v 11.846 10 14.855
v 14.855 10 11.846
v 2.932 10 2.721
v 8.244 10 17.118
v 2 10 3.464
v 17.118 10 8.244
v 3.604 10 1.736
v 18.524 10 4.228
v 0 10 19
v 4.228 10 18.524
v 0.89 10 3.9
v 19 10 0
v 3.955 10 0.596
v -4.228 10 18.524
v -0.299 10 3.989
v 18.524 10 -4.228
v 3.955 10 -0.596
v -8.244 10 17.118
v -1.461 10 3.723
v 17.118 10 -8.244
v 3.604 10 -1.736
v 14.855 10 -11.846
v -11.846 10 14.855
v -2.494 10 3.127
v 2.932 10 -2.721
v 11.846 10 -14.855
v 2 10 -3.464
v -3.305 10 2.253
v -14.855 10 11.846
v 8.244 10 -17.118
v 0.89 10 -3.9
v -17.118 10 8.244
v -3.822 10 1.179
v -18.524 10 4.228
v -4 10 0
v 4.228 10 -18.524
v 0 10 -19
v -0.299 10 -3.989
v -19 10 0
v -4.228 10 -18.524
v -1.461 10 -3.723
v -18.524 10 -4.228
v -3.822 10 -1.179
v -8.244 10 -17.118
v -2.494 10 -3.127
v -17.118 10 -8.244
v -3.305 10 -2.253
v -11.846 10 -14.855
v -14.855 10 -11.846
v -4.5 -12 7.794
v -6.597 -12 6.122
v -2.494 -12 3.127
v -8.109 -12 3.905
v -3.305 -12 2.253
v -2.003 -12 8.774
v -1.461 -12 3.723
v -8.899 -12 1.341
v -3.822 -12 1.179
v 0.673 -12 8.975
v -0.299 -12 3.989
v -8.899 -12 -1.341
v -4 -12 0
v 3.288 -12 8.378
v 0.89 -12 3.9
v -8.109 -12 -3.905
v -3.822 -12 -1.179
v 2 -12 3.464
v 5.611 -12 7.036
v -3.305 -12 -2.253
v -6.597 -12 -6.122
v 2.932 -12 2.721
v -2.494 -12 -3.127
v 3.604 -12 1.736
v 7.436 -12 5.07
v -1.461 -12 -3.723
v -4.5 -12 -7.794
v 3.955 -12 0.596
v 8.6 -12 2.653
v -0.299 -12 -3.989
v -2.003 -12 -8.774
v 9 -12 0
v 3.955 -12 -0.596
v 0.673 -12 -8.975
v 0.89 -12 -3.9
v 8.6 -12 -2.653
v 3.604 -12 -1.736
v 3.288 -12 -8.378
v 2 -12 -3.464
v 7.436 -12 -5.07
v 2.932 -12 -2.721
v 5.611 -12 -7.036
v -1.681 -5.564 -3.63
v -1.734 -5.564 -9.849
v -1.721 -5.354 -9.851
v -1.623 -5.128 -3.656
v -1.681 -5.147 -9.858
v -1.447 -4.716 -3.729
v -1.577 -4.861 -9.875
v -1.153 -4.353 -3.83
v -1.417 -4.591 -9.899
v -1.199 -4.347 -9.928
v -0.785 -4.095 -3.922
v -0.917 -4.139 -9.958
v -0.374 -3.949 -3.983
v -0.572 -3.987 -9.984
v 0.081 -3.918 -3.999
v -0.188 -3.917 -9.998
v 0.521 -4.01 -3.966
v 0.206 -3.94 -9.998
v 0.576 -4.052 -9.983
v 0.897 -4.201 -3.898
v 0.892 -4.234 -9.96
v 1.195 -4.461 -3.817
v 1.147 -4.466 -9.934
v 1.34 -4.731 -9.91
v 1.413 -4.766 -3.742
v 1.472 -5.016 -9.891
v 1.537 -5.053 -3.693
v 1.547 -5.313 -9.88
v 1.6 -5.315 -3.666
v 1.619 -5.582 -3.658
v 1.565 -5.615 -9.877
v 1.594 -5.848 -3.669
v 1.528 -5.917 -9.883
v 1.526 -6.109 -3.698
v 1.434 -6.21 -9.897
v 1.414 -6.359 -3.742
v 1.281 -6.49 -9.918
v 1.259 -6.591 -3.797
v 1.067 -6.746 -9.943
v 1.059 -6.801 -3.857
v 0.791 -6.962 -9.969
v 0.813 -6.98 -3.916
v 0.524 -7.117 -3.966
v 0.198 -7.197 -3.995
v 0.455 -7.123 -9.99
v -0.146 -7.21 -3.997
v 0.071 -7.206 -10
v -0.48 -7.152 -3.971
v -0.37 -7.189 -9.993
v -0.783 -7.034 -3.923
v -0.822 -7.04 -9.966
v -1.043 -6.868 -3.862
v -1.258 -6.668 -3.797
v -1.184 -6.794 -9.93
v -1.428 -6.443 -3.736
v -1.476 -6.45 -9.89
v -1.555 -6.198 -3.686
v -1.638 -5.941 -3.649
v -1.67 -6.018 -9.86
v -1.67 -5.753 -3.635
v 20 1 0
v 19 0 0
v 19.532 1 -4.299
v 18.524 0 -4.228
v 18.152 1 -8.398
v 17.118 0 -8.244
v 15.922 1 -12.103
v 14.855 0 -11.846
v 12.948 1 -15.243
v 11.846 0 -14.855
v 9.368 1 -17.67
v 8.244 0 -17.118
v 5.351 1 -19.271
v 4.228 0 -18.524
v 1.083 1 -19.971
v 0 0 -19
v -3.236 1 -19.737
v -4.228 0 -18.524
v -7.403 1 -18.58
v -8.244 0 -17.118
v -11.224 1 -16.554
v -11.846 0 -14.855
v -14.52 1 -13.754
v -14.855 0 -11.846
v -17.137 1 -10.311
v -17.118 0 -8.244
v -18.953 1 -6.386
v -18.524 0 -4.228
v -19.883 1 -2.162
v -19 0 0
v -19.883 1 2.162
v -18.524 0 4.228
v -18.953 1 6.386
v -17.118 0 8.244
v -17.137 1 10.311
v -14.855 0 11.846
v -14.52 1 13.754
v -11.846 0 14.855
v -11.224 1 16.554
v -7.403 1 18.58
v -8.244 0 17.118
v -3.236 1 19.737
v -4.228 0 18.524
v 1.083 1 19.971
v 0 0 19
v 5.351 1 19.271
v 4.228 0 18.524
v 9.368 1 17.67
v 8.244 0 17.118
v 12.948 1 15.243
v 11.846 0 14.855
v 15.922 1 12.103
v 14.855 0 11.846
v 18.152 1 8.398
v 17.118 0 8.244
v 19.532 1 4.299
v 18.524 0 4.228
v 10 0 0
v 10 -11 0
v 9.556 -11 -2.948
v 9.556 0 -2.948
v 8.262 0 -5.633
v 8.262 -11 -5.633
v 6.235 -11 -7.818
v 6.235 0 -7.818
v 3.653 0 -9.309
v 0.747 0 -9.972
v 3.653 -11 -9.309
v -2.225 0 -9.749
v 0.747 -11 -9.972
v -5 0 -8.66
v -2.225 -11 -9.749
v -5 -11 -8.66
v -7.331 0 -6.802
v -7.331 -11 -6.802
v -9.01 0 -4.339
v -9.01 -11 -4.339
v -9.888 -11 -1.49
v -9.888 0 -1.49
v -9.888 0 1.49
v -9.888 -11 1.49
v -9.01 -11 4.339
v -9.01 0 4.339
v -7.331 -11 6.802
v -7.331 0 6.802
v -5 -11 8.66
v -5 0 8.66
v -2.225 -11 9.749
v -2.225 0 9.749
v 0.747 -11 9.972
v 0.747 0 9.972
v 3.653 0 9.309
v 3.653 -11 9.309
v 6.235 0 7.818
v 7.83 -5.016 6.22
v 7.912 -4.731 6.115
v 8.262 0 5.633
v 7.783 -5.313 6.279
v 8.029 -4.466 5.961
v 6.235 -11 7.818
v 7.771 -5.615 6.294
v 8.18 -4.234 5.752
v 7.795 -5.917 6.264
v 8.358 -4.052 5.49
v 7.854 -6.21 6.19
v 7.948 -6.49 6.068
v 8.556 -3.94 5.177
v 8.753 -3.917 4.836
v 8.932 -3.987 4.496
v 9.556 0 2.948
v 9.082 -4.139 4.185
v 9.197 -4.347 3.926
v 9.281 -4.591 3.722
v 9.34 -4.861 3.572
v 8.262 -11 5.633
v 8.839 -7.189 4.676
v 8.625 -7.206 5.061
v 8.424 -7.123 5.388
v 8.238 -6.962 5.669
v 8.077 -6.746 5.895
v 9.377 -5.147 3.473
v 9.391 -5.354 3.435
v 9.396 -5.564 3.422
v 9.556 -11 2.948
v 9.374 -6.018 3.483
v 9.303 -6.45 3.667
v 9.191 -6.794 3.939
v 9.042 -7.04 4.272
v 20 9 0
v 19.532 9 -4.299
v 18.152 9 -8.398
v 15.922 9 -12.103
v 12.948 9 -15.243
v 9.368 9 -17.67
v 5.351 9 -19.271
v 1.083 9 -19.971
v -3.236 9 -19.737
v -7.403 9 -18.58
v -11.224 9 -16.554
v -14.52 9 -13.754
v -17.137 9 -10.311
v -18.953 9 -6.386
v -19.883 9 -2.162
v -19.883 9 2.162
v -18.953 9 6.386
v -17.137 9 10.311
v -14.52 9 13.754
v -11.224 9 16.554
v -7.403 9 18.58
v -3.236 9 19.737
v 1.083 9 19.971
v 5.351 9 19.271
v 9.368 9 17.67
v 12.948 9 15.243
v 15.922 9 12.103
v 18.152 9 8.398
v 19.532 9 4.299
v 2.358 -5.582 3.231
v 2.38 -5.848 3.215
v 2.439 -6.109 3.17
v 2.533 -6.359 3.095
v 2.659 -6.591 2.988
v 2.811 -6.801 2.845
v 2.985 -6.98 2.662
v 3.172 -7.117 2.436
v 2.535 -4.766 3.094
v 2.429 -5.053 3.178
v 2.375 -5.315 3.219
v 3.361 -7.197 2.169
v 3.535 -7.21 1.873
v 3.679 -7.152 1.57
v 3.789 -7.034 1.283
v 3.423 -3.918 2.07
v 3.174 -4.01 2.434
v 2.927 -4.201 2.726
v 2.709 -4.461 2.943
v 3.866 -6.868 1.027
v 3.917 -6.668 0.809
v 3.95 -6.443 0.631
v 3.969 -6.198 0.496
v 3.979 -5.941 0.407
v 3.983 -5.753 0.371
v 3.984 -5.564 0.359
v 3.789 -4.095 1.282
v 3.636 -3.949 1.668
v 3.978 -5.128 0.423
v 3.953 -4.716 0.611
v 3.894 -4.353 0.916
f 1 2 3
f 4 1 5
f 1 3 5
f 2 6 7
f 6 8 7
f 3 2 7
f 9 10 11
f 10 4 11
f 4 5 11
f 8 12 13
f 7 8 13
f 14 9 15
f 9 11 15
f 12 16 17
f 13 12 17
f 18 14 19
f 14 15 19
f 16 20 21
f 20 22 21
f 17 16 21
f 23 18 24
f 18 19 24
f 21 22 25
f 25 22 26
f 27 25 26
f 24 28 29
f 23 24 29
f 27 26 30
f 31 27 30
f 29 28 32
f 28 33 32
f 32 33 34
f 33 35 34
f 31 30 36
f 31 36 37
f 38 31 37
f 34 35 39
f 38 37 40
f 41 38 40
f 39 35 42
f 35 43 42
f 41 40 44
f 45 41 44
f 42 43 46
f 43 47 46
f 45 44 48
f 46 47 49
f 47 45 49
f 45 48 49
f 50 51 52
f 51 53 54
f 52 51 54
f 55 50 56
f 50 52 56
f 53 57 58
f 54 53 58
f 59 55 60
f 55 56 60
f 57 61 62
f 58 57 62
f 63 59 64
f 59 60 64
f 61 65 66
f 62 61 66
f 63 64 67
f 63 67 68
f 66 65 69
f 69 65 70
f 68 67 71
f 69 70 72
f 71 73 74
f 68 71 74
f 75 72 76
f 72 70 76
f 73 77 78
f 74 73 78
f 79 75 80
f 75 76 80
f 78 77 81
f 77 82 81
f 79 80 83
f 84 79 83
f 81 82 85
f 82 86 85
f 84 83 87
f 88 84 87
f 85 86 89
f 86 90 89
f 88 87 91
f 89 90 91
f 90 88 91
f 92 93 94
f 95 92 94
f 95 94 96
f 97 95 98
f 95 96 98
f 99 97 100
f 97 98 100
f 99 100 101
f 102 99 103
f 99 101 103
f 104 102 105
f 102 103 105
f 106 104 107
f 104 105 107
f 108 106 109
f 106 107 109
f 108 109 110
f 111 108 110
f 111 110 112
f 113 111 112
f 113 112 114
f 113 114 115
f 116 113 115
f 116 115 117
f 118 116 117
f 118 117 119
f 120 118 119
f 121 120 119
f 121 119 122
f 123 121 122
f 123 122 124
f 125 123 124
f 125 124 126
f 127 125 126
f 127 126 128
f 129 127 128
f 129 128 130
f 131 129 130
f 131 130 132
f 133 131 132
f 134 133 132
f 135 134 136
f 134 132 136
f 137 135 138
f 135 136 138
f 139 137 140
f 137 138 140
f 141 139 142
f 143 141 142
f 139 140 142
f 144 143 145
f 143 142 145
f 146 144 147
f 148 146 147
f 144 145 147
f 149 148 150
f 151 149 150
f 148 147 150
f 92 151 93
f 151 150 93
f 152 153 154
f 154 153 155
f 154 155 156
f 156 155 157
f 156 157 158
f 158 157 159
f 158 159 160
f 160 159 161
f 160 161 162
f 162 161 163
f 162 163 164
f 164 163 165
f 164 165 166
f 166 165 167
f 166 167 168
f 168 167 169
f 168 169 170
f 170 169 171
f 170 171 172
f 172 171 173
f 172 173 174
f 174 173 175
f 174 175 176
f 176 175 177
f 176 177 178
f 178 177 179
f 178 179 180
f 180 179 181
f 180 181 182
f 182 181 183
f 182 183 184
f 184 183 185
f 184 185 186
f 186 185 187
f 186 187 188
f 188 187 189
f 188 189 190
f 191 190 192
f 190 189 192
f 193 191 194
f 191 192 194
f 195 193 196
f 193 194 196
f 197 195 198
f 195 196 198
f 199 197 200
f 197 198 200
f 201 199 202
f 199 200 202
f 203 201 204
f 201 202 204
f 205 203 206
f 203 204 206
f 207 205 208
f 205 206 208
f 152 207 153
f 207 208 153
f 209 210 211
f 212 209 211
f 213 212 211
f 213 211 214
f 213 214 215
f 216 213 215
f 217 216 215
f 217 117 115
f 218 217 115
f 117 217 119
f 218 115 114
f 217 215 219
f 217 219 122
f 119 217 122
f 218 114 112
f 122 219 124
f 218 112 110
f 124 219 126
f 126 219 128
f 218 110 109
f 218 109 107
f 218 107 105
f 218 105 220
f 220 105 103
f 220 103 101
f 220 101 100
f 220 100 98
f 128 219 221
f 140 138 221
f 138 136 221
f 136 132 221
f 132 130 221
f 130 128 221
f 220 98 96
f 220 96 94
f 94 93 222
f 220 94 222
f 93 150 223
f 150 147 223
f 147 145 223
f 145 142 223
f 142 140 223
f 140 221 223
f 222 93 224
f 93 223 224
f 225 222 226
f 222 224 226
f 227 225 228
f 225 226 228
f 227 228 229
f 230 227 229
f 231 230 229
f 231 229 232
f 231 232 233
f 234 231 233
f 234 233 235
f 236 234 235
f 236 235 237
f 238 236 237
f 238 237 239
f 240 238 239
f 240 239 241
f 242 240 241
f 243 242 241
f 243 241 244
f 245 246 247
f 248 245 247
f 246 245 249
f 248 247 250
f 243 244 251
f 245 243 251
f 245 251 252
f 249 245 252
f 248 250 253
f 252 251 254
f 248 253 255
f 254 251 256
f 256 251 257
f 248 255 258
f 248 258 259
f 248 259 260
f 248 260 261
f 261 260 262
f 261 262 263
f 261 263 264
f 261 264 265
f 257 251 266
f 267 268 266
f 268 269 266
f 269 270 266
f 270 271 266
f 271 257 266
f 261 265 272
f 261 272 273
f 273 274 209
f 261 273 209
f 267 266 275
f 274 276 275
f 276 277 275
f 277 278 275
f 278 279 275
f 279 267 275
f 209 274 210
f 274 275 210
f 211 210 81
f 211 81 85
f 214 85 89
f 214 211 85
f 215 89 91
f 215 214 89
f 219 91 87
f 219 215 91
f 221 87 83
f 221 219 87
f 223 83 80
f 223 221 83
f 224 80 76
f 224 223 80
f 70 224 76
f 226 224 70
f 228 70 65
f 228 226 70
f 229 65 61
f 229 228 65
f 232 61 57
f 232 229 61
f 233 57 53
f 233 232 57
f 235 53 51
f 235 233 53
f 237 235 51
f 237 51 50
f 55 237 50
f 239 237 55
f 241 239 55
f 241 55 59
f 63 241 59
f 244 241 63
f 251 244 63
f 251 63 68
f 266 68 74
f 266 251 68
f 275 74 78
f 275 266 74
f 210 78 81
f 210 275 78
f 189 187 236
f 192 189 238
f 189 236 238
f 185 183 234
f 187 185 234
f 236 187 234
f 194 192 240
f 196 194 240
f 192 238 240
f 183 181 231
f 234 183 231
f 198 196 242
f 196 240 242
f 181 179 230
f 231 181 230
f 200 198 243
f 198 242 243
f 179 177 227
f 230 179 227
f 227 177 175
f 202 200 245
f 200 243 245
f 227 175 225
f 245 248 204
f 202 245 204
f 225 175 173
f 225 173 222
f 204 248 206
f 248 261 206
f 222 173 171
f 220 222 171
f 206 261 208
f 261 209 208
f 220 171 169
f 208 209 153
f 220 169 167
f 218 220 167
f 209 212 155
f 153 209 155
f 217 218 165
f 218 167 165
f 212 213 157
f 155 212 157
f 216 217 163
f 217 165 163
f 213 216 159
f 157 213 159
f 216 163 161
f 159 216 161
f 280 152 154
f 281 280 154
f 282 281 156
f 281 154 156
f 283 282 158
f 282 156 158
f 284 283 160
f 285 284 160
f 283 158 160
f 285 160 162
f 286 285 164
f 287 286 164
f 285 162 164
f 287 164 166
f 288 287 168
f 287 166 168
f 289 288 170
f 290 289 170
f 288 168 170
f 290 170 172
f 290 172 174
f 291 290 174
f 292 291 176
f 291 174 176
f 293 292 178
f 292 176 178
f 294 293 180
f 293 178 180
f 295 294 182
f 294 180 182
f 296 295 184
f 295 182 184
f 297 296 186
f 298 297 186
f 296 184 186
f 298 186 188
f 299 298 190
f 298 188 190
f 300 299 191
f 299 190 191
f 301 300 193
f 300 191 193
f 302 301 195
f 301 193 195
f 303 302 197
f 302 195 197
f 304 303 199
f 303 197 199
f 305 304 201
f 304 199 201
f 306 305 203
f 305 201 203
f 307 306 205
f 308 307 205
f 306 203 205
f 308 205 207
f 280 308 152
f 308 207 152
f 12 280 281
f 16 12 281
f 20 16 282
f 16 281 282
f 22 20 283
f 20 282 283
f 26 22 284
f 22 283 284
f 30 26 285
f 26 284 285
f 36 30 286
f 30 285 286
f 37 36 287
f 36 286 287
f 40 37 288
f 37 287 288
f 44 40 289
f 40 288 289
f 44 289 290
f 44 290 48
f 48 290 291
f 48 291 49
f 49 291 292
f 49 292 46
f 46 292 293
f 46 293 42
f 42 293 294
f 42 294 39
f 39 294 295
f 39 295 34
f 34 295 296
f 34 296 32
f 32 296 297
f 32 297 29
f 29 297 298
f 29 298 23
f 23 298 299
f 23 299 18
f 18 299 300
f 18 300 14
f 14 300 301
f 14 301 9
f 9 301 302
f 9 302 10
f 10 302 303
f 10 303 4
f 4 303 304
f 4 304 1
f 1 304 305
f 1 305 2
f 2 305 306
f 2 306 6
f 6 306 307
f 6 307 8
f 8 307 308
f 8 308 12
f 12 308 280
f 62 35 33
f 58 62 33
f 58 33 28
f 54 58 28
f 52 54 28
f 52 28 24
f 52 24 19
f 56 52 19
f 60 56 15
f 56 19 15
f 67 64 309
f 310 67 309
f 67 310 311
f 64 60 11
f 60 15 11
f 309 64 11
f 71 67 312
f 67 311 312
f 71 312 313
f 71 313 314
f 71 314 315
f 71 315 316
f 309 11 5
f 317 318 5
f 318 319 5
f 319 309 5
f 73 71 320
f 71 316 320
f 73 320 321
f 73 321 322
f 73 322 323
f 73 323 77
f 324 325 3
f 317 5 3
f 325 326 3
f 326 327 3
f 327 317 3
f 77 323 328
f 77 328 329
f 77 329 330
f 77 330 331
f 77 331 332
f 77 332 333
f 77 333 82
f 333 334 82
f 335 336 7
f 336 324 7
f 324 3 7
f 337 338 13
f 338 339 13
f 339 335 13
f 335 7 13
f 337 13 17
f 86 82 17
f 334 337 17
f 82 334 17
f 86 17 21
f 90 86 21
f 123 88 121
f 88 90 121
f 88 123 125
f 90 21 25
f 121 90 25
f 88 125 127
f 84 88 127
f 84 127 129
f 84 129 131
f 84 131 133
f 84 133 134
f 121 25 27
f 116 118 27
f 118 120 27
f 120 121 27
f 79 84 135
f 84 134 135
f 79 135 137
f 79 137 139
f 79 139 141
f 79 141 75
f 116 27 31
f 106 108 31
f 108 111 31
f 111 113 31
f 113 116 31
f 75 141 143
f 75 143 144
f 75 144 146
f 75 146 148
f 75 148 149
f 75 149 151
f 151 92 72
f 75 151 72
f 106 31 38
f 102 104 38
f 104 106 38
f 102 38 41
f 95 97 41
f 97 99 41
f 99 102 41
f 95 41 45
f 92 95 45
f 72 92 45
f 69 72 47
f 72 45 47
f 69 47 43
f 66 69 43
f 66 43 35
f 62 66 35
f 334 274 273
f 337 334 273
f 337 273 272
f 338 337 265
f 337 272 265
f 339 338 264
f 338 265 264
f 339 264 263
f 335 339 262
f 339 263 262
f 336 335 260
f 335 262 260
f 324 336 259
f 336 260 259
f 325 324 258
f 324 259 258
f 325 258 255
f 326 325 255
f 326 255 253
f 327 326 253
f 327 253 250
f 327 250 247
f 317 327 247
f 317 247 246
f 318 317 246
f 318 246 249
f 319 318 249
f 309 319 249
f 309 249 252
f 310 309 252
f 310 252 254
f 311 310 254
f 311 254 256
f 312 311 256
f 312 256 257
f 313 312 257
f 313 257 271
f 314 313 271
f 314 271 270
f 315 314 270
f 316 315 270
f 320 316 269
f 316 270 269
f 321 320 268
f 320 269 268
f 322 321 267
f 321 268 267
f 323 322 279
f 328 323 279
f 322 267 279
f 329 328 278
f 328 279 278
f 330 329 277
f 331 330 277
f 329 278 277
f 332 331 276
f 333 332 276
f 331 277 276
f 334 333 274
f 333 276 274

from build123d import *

# Parameters (mm, degrees)
SKETCH2_R                  = 4
CUT_EXTRUDE1_DEPTH         = 36.832945734
CHAMFER1_SIZE              = 1
M4X0_7_TAPPED_HOLE1_REACH  = 41.314
M4X0_7_TAPPED_HOLE1_BORE_R = 1.65
CIRPATTERN3_COUNT          = 2
CIRPATTERN3_ANGLE          = 120


with BuildPart() as part:
    # Sketch1 → Revolve1 (revolve)
    with BuildSketch(Plane.XY):
        Polygon((0, 10), (20, 10), (20, 0), (10, 0), (10, -12), (0, -12), align=None)
    revolve(axis=Axis((0, -12, 0), (0, 1, 0)))

    # Sketch2 → Cut-Extrude1 (cut, through all)
    with BuildSketch(Plane(origin=(0, 10, 0), x_dir=(1, 0, 0), z_dir=(0, 1, 0))):
        with Locations(Location((0, 0, 0), (0, 0, 180))):
            Circle(SKETCH2_R)
    extrude(amount=-CUT_EXTRUDE1_DEPTH, mode=Mode.SUBTRACT)

    # Chamfer1
    chamfer1_edges = [part.edges().sort_by_distance(p)[0] for p in [
        (-10, -12, 0),
        (-20, 0, 0),
        (-20, 10, 0),
    ]]
    chamfer(chamfer1_edges, length=CHAMFER1_SIZE)

    # M4x0.7 Tapped Hole1 bore (on position points) → M4x0.7 Tapped Hole1 (cut, up to next)
    with BuildSketch(Plane(origin=(-0.085304599, -5.563796066, -9.99963615), x_dir=(-0.999963614965, 0, 0.008530459937), z_dir=(-0.008530459937, 0, -0.999963614965)), mode=Mode.PRIVATE) as m4x0_7_tapped_hole1_sk1:
        Circle(M4X0_7_TAPPED_HOLE1_BORE_R)
    m4x0_7_tapped_hole1_tool1 = extrude(m4x0_7_tapped_hole1_sk1.sketch, amount=-M4X0_7_TAPPED_HOLE1_REACH, mode=Mode.PRIVATE) & part.part
    m4x0_7_tapped_hole1 = m4x0_7_tapped_hole1_tool1.solids().sort_by_distance((-0.085305, -5.563796, -9.999636))[0]
    add(m4x0_7_tapped_hole1, mode=Mode.SUBTRACT)

    # CirPattern3: M4x0.7 Tapped Hole1 ×2 about axis
    cirpattern3_axis = Axis((0, -12, 0), (0, -1, 0))
    for i in range(1, CIRPATTERN3_COUNT):
        add(m4x0_7_tapped_hole1.rotate(cirpattern3_axis, i * CIRPATTERN3_ANGLE / (CIRPATTERN3_COUNT - 1)), mode=Mode.SUBTRACT)


solid = part.part
